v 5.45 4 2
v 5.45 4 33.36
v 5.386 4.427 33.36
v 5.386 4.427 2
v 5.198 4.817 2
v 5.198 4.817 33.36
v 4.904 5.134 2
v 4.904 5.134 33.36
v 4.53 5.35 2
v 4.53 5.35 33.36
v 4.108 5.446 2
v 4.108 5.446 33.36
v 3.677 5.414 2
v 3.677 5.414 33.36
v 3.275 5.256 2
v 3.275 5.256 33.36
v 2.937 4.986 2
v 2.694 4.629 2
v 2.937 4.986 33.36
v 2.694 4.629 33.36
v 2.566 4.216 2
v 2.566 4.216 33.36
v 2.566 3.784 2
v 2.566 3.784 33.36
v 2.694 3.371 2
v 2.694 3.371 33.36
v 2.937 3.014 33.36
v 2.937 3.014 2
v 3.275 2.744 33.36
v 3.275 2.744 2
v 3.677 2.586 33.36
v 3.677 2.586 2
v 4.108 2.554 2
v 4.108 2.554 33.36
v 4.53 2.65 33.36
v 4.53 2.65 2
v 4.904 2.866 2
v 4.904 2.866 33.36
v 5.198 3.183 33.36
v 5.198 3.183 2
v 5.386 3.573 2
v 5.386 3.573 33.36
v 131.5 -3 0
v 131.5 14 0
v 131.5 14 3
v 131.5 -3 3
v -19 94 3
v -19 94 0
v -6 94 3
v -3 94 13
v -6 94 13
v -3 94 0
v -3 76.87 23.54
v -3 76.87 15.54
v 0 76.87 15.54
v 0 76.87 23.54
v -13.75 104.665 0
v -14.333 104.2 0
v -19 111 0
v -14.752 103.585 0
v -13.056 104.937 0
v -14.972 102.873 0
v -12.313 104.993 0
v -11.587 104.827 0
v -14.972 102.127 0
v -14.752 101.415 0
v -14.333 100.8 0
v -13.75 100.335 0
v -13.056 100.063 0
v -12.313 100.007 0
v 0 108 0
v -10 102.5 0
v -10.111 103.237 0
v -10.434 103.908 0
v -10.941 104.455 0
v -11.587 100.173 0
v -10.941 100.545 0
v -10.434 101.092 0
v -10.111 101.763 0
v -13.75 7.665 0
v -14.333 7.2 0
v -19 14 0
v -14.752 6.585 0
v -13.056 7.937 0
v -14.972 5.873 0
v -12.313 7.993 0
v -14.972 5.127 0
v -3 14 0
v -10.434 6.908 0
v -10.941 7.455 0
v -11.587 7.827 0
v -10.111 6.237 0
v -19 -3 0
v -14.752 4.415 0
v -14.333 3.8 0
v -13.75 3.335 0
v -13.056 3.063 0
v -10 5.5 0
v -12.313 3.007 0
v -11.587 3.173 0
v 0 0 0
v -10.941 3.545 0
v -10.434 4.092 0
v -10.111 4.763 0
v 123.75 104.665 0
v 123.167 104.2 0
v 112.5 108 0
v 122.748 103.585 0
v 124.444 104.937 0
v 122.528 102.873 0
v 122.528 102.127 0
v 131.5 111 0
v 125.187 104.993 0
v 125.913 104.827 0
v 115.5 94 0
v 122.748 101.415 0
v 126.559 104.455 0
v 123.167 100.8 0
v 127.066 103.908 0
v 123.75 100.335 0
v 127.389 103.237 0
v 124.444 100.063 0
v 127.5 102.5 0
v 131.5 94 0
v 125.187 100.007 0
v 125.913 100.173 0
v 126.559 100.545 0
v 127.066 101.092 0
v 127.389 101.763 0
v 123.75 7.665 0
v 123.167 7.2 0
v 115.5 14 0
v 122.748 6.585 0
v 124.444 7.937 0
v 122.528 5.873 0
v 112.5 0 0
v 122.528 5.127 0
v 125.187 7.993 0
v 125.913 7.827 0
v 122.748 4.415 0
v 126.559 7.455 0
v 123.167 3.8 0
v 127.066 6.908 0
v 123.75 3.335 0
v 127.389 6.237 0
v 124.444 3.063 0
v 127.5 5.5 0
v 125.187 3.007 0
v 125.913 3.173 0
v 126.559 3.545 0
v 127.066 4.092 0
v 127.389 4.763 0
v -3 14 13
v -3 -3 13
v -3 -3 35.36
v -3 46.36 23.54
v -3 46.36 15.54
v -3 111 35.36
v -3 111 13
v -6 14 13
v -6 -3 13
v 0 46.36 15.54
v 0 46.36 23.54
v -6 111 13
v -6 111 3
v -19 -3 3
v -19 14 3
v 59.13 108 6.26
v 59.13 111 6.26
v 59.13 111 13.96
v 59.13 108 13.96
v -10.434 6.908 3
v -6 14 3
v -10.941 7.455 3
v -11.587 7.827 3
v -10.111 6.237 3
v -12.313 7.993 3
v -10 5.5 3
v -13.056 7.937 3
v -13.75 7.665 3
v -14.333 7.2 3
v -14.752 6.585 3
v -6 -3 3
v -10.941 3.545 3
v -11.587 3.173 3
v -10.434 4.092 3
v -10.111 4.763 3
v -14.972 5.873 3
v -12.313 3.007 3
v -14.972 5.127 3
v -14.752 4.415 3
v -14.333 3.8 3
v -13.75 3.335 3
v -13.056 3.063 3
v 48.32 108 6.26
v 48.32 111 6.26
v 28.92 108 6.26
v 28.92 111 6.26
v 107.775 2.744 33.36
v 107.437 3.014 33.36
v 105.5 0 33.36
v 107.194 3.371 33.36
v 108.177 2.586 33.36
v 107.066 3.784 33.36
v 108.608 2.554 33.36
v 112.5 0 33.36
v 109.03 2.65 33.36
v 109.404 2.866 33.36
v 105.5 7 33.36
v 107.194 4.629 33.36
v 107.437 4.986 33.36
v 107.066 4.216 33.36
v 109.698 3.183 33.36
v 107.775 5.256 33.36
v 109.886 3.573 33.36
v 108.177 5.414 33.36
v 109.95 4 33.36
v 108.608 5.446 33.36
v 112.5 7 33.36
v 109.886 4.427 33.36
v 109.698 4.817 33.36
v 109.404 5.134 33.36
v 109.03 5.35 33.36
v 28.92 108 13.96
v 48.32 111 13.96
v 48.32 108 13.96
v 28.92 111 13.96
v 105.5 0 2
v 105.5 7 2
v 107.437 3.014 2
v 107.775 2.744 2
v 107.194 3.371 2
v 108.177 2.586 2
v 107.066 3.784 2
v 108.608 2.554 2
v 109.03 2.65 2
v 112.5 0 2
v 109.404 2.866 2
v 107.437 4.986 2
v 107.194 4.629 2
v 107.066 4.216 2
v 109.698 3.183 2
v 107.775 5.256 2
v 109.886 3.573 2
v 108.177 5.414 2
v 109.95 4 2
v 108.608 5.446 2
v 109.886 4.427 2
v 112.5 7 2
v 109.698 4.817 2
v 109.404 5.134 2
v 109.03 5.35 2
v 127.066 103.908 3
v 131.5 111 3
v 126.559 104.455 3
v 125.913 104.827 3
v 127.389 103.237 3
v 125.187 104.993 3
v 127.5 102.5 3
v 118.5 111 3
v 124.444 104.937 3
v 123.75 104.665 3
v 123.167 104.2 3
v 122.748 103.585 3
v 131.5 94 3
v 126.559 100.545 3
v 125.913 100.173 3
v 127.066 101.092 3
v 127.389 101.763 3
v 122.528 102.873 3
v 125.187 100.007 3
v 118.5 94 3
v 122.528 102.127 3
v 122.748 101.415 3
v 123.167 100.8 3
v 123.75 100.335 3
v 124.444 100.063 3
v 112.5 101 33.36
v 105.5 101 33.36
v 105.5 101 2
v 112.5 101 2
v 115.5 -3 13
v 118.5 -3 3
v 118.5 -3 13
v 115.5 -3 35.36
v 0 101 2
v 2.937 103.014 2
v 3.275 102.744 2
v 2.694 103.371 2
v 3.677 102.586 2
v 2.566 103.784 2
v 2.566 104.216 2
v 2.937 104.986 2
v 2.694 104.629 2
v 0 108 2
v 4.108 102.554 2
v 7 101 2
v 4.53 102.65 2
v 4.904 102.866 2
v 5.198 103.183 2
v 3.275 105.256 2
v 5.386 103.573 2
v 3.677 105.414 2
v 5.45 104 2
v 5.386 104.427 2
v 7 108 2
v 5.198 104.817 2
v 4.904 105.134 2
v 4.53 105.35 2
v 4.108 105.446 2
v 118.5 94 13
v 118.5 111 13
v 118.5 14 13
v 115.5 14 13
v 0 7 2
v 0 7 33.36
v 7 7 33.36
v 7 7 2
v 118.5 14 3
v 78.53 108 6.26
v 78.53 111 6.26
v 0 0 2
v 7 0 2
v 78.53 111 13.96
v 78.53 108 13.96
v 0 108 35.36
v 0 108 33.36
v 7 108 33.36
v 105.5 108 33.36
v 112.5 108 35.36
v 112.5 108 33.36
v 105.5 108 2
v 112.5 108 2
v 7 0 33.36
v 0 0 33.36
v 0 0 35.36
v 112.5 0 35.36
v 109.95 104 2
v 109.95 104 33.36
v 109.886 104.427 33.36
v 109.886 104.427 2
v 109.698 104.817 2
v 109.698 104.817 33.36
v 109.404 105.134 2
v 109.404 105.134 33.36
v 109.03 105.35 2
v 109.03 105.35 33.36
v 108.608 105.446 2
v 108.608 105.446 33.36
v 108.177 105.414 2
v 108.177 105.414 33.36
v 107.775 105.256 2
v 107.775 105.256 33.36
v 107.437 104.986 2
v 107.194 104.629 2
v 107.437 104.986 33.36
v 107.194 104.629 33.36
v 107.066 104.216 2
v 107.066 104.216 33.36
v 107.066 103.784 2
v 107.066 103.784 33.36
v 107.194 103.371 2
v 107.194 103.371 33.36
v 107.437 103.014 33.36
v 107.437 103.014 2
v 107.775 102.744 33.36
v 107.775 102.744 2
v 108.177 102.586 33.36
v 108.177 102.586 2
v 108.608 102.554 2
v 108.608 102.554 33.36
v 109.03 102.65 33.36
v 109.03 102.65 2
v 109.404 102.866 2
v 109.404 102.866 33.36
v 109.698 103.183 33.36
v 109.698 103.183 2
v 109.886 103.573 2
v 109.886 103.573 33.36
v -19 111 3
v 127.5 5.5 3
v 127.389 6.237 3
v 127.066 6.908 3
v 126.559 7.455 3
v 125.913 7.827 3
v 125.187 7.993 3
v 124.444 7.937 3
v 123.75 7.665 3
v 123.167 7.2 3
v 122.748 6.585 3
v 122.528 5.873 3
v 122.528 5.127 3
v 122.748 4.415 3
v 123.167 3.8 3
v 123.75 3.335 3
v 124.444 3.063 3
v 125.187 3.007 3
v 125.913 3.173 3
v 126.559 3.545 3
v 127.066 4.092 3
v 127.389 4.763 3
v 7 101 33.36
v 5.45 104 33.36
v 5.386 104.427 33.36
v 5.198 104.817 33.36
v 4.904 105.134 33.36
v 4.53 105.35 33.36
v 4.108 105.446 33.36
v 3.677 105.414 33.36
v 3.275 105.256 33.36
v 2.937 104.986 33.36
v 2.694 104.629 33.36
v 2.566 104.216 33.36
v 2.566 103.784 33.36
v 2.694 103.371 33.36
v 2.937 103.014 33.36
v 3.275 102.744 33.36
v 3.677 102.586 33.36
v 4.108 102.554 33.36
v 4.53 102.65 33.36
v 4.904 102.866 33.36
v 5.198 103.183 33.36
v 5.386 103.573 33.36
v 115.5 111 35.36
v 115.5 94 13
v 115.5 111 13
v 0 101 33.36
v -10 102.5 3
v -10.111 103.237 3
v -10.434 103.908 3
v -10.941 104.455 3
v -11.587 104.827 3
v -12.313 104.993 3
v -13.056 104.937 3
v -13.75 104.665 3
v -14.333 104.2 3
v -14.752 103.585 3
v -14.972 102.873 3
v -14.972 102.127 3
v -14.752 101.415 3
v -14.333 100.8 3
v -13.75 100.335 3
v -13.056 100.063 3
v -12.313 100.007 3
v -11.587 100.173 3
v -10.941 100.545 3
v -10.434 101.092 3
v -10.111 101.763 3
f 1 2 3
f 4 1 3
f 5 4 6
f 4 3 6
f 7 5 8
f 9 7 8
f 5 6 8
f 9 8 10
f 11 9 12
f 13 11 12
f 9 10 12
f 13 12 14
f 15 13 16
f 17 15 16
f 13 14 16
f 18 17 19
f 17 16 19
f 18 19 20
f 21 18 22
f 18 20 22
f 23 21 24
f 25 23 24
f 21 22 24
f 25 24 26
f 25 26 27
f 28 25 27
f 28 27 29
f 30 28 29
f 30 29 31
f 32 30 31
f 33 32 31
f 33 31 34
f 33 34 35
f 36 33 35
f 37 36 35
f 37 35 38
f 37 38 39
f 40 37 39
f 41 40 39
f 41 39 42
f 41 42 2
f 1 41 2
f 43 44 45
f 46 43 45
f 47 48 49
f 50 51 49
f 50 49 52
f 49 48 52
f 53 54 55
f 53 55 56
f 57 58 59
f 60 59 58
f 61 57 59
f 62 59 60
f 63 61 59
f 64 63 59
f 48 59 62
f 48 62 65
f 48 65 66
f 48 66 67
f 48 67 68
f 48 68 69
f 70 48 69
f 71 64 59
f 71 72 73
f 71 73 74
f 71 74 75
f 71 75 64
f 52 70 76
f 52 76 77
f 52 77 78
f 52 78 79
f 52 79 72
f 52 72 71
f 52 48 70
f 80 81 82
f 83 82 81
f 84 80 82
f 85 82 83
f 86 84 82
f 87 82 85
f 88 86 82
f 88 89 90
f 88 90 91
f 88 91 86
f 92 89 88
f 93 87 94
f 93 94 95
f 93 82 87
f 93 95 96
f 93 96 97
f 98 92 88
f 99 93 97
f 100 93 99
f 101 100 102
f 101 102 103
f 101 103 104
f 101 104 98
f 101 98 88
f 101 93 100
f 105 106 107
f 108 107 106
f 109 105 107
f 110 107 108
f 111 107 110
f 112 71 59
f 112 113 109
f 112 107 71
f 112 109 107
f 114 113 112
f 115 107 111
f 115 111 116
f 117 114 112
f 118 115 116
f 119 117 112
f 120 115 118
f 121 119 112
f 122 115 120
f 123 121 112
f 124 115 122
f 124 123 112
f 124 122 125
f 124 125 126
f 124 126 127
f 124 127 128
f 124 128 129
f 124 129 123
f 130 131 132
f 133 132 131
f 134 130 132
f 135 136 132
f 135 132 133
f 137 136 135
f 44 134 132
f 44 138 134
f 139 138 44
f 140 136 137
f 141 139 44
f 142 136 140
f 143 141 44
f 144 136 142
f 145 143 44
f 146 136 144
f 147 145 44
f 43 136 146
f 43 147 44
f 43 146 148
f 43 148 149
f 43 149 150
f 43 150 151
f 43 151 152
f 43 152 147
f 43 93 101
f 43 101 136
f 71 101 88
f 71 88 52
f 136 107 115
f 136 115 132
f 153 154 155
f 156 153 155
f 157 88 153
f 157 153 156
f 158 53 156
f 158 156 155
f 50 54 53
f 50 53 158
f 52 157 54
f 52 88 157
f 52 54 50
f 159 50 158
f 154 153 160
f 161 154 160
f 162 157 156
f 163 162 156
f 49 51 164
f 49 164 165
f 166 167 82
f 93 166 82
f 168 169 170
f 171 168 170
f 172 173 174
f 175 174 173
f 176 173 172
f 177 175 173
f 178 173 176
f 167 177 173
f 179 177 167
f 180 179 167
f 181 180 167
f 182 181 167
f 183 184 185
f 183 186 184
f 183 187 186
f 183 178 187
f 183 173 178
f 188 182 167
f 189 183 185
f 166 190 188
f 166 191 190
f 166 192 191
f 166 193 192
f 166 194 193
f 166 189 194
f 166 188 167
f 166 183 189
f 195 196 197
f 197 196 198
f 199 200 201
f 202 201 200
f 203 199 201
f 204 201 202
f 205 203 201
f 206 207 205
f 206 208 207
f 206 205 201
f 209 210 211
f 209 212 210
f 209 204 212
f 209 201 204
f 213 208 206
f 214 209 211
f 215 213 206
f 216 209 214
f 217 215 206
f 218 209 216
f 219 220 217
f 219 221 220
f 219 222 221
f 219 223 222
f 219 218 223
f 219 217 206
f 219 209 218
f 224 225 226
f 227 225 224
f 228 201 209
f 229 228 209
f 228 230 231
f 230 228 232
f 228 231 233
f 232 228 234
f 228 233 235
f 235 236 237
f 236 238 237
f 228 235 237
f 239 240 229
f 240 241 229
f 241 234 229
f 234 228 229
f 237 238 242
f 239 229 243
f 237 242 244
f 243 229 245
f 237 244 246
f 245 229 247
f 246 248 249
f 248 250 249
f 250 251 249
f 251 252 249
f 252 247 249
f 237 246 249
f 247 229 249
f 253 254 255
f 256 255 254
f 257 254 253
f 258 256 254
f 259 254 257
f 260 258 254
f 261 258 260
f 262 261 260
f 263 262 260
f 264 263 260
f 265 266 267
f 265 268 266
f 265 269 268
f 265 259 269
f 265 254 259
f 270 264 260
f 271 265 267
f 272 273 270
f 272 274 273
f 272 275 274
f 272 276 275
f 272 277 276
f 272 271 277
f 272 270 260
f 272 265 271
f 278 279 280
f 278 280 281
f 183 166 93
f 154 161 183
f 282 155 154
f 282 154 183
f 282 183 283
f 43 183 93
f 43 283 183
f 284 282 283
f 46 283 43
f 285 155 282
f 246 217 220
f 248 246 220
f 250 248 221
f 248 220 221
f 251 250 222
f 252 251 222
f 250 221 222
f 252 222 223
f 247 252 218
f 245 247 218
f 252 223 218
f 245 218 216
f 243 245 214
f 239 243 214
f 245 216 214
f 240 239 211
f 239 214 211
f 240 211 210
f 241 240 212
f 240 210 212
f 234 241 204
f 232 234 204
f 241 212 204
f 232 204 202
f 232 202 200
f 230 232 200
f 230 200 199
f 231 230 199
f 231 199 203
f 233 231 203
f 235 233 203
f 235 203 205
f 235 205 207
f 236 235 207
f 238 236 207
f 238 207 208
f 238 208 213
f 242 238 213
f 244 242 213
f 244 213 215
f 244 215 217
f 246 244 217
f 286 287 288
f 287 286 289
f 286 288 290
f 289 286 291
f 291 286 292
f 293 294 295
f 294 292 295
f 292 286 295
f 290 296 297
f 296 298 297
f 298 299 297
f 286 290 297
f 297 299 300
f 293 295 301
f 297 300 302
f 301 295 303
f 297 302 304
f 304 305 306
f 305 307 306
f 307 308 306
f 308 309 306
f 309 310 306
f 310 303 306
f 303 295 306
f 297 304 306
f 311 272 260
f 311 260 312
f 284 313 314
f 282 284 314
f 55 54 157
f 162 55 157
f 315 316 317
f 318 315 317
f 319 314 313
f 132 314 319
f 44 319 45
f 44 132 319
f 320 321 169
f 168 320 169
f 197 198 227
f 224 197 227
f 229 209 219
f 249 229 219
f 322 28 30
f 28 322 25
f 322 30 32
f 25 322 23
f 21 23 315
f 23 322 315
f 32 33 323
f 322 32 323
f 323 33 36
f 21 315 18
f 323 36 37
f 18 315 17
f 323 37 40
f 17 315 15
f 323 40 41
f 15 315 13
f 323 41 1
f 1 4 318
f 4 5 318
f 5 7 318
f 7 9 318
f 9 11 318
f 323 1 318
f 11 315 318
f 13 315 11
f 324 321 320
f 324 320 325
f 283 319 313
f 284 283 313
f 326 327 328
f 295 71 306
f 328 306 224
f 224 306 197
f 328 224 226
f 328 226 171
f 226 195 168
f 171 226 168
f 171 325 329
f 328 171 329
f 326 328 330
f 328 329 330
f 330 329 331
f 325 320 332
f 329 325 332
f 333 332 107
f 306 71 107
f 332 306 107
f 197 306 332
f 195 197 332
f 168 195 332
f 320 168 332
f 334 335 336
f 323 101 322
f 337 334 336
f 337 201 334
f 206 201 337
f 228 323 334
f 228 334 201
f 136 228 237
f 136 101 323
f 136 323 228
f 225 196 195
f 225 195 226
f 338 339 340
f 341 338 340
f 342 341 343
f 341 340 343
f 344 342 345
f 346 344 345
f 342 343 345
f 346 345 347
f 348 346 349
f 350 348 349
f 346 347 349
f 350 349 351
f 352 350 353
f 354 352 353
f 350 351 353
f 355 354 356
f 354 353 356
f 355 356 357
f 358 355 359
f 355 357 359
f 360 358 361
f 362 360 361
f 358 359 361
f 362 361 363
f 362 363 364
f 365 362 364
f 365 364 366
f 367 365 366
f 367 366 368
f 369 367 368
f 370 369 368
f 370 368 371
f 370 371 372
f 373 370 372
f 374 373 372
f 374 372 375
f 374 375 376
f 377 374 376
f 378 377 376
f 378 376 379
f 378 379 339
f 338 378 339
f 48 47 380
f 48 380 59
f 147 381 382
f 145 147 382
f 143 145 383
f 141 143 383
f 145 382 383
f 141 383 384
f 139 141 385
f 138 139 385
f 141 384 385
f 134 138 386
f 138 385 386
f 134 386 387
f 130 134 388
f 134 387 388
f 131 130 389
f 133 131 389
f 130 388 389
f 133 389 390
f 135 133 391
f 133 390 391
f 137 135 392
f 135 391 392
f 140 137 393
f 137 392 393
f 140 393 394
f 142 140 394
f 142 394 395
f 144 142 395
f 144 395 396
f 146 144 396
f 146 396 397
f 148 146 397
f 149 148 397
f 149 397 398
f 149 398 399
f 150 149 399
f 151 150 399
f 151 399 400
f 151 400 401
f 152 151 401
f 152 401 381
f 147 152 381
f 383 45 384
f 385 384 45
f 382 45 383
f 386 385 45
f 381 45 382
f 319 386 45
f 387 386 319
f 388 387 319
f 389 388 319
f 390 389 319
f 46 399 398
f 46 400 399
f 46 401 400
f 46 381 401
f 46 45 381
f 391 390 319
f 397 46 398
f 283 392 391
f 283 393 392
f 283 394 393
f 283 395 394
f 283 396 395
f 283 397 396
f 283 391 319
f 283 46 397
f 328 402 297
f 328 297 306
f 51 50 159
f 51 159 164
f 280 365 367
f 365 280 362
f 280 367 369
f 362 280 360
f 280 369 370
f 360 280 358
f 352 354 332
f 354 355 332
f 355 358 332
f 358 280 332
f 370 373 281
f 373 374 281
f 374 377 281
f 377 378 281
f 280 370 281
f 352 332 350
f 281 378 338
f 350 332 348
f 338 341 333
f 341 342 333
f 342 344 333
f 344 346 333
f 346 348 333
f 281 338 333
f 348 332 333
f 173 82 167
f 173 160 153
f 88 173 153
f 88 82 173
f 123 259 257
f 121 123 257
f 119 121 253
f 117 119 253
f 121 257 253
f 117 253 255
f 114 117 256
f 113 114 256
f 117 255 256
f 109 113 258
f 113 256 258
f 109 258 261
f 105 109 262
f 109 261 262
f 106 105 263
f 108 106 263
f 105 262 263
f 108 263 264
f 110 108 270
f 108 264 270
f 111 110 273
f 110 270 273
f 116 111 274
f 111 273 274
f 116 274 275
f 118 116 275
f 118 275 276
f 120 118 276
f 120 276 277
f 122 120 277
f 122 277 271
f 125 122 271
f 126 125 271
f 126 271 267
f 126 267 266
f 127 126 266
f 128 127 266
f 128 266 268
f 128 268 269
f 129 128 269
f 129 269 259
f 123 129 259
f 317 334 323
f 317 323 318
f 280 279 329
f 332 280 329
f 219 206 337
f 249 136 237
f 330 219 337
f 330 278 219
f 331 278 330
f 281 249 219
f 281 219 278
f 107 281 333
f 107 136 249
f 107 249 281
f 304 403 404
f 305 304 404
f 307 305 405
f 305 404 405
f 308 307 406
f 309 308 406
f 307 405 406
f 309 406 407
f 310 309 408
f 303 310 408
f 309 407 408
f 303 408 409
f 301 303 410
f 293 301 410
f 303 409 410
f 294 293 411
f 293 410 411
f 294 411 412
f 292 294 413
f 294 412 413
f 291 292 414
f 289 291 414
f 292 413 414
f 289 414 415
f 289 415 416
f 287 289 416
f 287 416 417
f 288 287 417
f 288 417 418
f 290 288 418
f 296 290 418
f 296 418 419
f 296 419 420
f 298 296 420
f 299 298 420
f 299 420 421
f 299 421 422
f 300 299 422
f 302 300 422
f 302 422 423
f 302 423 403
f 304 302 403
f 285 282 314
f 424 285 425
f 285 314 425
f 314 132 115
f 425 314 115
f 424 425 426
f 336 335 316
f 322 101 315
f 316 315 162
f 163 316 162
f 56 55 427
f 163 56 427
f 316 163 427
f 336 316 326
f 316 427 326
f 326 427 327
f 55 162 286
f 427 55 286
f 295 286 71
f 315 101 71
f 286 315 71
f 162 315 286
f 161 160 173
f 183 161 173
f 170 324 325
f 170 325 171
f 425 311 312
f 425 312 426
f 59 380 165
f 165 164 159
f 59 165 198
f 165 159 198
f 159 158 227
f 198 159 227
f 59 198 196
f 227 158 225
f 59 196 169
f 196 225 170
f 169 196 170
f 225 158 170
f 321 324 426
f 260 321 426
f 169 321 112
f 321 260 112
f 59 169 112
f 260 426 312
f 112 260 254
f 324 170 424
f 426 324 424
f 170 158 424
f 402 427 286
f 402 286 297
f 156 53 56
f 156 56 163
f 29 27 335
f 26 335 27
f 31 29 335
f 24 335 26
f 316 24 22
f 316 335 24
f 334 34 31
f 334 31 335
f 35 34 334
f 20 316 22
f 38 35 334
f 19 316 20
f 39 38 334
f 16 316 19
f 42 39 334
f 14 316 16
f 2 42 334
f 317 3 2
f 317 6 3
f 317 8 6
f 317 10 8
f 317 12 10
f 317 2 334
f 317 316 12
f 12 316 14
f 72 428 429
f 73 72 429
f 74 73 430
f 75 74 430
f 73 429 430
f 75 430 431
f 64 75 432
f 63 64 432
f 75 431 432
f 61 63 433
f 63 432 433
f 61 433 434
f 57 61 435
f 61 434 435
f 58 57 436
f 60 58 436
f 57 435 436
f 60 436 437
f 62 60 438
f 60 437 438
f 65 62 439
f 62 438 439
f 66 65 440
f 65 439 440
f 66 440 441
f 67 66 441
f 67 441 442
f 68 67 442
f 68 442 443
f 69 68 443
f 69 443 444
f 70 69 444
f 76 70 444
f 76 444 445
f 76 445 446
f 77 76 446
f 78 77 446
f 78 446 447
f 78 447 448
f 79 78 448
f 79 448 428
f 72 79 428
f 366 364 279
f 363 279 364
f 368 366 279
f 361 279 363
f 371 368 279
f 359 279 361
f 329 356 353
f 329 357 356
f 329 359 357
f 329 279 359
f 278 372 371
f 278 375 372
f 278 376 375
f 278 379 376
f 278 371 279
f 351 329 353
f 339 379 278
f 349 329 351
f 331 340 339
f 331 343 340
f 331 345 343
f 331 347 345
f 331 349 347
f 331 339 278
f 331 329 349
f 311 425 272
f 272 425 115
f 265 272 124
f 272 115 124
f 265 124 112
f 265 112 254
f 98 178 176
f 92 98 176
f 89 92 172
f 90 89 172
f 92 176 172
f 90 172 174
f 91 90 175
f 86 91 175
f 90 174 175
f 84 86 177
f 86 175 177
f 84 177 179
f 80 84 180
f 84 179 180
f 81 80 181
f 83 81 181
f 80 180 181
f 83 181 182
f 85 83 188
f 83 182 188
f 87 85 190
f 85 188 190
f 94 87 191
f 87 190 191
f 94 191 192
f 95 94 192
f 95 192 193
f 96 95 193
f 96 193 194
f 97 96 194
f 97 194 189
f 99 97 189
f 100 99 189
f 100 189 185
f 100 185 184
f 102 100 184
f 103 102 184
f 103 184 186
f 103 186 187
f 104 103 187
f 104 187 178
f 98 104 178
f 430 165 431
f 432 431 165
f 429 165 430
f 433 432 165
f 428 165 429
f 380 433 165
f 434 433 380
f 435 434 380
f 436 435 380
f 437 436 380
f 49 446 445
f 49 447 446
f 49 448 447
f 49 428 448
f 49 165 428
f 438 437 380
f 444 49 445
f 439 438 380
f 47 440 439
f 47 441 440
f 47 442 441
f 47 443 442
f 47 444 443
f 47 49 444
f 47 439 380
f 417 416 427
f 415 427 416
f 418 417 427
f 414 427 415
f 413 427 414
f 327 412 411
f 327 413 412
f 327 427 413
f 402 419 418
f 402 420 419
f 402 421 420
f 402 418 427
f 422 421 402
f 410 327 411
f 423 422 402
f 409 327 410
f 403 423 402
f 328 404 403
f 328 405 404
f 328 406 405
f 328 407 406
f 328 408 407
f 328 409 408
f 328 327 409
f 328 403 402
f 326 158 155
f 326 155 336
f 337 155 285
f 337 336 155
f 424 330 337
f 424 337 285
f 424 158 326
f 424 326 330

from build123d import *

# Parameters (mm, degrees)
F0_W      = 118.5
F0_H      = 114
F0_W_2    = 112.5
F0_H_2    = 108
F1_DEPTH  = 35.36
F3_START  = -2
F2_W      = 7
F2_H      = 7
F3_DEPTH  = 31.36
F4_R      = 1.45
F5_DEPTH  = 33.361
F6_W      = 30.51
F6_H      = 8
F7_DEPTH  = 3
F8_W      = 19.4
F8_H      = 7.7
F9_DEPTH  = 3
F11_DEPTH = 114
F13_DEPTH = 114
F15_W     = 16
F15_H     = 80
F16_DEPTH = 35.361
F17_W     = 16
F17_H     = 80
F18_DEPTH = 35.361
F19_R     = 2.5
F20_DEPTH = 3.001


# Not quite as in the source:
# - a feature names something its author has since deleted; it is built from what else it names


with BuildPart() as f1:
    # F0 (on Top) → F1 (new body)
    with BuildSketch(Plane.XY):
        with Locations((56.25, 54)):
            Rectangle(F0_W, F0_H)
        with Locations((56.25, 54)):
            Rectangle(F0_W_2, F0_H_2, mode=Mode.SUBTRACT)
    extrude(amount=F1_DEPTH)

    # F2 (on face) → F3 (join)
    with BuildSketch(Plane.XY.offset(35.36).offset(F3_START)):
        with Locations((3.5, 104.5)):
            Rectangle(F2_W, F2_H)
        with Locations((109, 104.5)):
            Rectangle(F2_W, F2_H)
        with Locations((109, 3.5)):
            Rectangle(F2_W, F2_H)
        with Locations((3.5, 3.5)):
            Rectangle(F2_W, F2_H)
    extrude(amount=-F3_DEPTH)

    # F4 (on face) → F5 (cut, through all)
    with BuildSketch(Plane.XY.offset(33.36)):
        with Locations((4, 104)):
            Circle(F4_R)
        with Locations((108.5, 104)):
            Circle(F4_R)
        with Locations((4, 4)):
            Circle(F4_R)
        with Locations((108.5, 4)):
            Circle(F4_R)
    extrude(amount=-F5_DEPTH, mode=Mode.SUBTRACT)

    # F6 (on face) → F7 (cut, through all)
    with BuildSketch(Plane(origin=(-3, 0, 0), x_dir=(0, -1, 0), z_dir=(-1, 0, 0))):
        with Locations((-61.615, 19.54)):
            Rectangle(F6_W, F6_H)
    extrude(amount=-F7_DEPTH, mode=Mode.SUBTRACT)

    # F8 (on face) → F9 (cut)
    with BuildSketch(Plane(origin=(0, 111, 0), x_dir=(-1, 0, 0), z_dir=(0, 1, 0))):
        with Locations((-68.83, 10.11)):
            Rectangle(F8_W, F8_H)
        with Locations((-38.62, 10.11)):
            Rectangle(F8_W, F8_H)
    extrude(amount=-F9_DEPTH, mode=Mode.SUBTRACT)

    # F10 (on face) → F11 (join)
    with BuildSketch(Plane.XZ.offset(3)):
        Polygon((-6, 3), (-19, 3), (-19, 0), (-3, 0), (-3, 13), (-6, 13), align=None)
    extrude(amount=-F11_DEPTH)

    # F12 (on face) → F13 (join)
    with BuildSketch(Plane.XZ.offset(3)):
        Polygon((118.5, 13), (115.5, 13), (115.5, 0), (131.5, 0), (131.5, 3), (118.5, 3), align=None)
    extrude(amount=-F13_DEPTH)

    # F15 (on face) → F16 (cut, through all)
    with BuildSketch(Plane(origin=(0, 0, 0), x_dir=(1, 0, 0), z_dir=(0, 0, -1))):
        with Locations((-11, -54)):
            Rectangle(F15_W, F15_H)
    extrude(amount=-F16_DEPTH, mode=Mode.SUBTRACT)

    # F17 (on face) → F18 (cut, through all)
    with BuildSketch(Plane(origin=(0, 0, 0), x_dir=(1, 0, 0), z_dir=(0, 0, -1))):
        with Locations((123.5, -54)):
            Rectangle(F17_W, F17_H)
    extrude(amount=-F18_DEPTH, mode=Mode.SUBTRACT)

    # F19 (on face) → F20 (cut, through all)
    with BuildSketch(Plane.XY.offset(3)):
        with Locations((-12.5, 102.5)):
            Circle(F19_R)
        with Locations((125, 102.5)):
            Circle(F19_R)
        with Locations((125, 5.5)):
            Circle(F19_R)
        with Locations((-12.5, 5.5)):
            Circle(F19_R)
    extrude(amount=-F20_DEPTH, mode=Mode.SUBTRACT)


solid = f1.part
